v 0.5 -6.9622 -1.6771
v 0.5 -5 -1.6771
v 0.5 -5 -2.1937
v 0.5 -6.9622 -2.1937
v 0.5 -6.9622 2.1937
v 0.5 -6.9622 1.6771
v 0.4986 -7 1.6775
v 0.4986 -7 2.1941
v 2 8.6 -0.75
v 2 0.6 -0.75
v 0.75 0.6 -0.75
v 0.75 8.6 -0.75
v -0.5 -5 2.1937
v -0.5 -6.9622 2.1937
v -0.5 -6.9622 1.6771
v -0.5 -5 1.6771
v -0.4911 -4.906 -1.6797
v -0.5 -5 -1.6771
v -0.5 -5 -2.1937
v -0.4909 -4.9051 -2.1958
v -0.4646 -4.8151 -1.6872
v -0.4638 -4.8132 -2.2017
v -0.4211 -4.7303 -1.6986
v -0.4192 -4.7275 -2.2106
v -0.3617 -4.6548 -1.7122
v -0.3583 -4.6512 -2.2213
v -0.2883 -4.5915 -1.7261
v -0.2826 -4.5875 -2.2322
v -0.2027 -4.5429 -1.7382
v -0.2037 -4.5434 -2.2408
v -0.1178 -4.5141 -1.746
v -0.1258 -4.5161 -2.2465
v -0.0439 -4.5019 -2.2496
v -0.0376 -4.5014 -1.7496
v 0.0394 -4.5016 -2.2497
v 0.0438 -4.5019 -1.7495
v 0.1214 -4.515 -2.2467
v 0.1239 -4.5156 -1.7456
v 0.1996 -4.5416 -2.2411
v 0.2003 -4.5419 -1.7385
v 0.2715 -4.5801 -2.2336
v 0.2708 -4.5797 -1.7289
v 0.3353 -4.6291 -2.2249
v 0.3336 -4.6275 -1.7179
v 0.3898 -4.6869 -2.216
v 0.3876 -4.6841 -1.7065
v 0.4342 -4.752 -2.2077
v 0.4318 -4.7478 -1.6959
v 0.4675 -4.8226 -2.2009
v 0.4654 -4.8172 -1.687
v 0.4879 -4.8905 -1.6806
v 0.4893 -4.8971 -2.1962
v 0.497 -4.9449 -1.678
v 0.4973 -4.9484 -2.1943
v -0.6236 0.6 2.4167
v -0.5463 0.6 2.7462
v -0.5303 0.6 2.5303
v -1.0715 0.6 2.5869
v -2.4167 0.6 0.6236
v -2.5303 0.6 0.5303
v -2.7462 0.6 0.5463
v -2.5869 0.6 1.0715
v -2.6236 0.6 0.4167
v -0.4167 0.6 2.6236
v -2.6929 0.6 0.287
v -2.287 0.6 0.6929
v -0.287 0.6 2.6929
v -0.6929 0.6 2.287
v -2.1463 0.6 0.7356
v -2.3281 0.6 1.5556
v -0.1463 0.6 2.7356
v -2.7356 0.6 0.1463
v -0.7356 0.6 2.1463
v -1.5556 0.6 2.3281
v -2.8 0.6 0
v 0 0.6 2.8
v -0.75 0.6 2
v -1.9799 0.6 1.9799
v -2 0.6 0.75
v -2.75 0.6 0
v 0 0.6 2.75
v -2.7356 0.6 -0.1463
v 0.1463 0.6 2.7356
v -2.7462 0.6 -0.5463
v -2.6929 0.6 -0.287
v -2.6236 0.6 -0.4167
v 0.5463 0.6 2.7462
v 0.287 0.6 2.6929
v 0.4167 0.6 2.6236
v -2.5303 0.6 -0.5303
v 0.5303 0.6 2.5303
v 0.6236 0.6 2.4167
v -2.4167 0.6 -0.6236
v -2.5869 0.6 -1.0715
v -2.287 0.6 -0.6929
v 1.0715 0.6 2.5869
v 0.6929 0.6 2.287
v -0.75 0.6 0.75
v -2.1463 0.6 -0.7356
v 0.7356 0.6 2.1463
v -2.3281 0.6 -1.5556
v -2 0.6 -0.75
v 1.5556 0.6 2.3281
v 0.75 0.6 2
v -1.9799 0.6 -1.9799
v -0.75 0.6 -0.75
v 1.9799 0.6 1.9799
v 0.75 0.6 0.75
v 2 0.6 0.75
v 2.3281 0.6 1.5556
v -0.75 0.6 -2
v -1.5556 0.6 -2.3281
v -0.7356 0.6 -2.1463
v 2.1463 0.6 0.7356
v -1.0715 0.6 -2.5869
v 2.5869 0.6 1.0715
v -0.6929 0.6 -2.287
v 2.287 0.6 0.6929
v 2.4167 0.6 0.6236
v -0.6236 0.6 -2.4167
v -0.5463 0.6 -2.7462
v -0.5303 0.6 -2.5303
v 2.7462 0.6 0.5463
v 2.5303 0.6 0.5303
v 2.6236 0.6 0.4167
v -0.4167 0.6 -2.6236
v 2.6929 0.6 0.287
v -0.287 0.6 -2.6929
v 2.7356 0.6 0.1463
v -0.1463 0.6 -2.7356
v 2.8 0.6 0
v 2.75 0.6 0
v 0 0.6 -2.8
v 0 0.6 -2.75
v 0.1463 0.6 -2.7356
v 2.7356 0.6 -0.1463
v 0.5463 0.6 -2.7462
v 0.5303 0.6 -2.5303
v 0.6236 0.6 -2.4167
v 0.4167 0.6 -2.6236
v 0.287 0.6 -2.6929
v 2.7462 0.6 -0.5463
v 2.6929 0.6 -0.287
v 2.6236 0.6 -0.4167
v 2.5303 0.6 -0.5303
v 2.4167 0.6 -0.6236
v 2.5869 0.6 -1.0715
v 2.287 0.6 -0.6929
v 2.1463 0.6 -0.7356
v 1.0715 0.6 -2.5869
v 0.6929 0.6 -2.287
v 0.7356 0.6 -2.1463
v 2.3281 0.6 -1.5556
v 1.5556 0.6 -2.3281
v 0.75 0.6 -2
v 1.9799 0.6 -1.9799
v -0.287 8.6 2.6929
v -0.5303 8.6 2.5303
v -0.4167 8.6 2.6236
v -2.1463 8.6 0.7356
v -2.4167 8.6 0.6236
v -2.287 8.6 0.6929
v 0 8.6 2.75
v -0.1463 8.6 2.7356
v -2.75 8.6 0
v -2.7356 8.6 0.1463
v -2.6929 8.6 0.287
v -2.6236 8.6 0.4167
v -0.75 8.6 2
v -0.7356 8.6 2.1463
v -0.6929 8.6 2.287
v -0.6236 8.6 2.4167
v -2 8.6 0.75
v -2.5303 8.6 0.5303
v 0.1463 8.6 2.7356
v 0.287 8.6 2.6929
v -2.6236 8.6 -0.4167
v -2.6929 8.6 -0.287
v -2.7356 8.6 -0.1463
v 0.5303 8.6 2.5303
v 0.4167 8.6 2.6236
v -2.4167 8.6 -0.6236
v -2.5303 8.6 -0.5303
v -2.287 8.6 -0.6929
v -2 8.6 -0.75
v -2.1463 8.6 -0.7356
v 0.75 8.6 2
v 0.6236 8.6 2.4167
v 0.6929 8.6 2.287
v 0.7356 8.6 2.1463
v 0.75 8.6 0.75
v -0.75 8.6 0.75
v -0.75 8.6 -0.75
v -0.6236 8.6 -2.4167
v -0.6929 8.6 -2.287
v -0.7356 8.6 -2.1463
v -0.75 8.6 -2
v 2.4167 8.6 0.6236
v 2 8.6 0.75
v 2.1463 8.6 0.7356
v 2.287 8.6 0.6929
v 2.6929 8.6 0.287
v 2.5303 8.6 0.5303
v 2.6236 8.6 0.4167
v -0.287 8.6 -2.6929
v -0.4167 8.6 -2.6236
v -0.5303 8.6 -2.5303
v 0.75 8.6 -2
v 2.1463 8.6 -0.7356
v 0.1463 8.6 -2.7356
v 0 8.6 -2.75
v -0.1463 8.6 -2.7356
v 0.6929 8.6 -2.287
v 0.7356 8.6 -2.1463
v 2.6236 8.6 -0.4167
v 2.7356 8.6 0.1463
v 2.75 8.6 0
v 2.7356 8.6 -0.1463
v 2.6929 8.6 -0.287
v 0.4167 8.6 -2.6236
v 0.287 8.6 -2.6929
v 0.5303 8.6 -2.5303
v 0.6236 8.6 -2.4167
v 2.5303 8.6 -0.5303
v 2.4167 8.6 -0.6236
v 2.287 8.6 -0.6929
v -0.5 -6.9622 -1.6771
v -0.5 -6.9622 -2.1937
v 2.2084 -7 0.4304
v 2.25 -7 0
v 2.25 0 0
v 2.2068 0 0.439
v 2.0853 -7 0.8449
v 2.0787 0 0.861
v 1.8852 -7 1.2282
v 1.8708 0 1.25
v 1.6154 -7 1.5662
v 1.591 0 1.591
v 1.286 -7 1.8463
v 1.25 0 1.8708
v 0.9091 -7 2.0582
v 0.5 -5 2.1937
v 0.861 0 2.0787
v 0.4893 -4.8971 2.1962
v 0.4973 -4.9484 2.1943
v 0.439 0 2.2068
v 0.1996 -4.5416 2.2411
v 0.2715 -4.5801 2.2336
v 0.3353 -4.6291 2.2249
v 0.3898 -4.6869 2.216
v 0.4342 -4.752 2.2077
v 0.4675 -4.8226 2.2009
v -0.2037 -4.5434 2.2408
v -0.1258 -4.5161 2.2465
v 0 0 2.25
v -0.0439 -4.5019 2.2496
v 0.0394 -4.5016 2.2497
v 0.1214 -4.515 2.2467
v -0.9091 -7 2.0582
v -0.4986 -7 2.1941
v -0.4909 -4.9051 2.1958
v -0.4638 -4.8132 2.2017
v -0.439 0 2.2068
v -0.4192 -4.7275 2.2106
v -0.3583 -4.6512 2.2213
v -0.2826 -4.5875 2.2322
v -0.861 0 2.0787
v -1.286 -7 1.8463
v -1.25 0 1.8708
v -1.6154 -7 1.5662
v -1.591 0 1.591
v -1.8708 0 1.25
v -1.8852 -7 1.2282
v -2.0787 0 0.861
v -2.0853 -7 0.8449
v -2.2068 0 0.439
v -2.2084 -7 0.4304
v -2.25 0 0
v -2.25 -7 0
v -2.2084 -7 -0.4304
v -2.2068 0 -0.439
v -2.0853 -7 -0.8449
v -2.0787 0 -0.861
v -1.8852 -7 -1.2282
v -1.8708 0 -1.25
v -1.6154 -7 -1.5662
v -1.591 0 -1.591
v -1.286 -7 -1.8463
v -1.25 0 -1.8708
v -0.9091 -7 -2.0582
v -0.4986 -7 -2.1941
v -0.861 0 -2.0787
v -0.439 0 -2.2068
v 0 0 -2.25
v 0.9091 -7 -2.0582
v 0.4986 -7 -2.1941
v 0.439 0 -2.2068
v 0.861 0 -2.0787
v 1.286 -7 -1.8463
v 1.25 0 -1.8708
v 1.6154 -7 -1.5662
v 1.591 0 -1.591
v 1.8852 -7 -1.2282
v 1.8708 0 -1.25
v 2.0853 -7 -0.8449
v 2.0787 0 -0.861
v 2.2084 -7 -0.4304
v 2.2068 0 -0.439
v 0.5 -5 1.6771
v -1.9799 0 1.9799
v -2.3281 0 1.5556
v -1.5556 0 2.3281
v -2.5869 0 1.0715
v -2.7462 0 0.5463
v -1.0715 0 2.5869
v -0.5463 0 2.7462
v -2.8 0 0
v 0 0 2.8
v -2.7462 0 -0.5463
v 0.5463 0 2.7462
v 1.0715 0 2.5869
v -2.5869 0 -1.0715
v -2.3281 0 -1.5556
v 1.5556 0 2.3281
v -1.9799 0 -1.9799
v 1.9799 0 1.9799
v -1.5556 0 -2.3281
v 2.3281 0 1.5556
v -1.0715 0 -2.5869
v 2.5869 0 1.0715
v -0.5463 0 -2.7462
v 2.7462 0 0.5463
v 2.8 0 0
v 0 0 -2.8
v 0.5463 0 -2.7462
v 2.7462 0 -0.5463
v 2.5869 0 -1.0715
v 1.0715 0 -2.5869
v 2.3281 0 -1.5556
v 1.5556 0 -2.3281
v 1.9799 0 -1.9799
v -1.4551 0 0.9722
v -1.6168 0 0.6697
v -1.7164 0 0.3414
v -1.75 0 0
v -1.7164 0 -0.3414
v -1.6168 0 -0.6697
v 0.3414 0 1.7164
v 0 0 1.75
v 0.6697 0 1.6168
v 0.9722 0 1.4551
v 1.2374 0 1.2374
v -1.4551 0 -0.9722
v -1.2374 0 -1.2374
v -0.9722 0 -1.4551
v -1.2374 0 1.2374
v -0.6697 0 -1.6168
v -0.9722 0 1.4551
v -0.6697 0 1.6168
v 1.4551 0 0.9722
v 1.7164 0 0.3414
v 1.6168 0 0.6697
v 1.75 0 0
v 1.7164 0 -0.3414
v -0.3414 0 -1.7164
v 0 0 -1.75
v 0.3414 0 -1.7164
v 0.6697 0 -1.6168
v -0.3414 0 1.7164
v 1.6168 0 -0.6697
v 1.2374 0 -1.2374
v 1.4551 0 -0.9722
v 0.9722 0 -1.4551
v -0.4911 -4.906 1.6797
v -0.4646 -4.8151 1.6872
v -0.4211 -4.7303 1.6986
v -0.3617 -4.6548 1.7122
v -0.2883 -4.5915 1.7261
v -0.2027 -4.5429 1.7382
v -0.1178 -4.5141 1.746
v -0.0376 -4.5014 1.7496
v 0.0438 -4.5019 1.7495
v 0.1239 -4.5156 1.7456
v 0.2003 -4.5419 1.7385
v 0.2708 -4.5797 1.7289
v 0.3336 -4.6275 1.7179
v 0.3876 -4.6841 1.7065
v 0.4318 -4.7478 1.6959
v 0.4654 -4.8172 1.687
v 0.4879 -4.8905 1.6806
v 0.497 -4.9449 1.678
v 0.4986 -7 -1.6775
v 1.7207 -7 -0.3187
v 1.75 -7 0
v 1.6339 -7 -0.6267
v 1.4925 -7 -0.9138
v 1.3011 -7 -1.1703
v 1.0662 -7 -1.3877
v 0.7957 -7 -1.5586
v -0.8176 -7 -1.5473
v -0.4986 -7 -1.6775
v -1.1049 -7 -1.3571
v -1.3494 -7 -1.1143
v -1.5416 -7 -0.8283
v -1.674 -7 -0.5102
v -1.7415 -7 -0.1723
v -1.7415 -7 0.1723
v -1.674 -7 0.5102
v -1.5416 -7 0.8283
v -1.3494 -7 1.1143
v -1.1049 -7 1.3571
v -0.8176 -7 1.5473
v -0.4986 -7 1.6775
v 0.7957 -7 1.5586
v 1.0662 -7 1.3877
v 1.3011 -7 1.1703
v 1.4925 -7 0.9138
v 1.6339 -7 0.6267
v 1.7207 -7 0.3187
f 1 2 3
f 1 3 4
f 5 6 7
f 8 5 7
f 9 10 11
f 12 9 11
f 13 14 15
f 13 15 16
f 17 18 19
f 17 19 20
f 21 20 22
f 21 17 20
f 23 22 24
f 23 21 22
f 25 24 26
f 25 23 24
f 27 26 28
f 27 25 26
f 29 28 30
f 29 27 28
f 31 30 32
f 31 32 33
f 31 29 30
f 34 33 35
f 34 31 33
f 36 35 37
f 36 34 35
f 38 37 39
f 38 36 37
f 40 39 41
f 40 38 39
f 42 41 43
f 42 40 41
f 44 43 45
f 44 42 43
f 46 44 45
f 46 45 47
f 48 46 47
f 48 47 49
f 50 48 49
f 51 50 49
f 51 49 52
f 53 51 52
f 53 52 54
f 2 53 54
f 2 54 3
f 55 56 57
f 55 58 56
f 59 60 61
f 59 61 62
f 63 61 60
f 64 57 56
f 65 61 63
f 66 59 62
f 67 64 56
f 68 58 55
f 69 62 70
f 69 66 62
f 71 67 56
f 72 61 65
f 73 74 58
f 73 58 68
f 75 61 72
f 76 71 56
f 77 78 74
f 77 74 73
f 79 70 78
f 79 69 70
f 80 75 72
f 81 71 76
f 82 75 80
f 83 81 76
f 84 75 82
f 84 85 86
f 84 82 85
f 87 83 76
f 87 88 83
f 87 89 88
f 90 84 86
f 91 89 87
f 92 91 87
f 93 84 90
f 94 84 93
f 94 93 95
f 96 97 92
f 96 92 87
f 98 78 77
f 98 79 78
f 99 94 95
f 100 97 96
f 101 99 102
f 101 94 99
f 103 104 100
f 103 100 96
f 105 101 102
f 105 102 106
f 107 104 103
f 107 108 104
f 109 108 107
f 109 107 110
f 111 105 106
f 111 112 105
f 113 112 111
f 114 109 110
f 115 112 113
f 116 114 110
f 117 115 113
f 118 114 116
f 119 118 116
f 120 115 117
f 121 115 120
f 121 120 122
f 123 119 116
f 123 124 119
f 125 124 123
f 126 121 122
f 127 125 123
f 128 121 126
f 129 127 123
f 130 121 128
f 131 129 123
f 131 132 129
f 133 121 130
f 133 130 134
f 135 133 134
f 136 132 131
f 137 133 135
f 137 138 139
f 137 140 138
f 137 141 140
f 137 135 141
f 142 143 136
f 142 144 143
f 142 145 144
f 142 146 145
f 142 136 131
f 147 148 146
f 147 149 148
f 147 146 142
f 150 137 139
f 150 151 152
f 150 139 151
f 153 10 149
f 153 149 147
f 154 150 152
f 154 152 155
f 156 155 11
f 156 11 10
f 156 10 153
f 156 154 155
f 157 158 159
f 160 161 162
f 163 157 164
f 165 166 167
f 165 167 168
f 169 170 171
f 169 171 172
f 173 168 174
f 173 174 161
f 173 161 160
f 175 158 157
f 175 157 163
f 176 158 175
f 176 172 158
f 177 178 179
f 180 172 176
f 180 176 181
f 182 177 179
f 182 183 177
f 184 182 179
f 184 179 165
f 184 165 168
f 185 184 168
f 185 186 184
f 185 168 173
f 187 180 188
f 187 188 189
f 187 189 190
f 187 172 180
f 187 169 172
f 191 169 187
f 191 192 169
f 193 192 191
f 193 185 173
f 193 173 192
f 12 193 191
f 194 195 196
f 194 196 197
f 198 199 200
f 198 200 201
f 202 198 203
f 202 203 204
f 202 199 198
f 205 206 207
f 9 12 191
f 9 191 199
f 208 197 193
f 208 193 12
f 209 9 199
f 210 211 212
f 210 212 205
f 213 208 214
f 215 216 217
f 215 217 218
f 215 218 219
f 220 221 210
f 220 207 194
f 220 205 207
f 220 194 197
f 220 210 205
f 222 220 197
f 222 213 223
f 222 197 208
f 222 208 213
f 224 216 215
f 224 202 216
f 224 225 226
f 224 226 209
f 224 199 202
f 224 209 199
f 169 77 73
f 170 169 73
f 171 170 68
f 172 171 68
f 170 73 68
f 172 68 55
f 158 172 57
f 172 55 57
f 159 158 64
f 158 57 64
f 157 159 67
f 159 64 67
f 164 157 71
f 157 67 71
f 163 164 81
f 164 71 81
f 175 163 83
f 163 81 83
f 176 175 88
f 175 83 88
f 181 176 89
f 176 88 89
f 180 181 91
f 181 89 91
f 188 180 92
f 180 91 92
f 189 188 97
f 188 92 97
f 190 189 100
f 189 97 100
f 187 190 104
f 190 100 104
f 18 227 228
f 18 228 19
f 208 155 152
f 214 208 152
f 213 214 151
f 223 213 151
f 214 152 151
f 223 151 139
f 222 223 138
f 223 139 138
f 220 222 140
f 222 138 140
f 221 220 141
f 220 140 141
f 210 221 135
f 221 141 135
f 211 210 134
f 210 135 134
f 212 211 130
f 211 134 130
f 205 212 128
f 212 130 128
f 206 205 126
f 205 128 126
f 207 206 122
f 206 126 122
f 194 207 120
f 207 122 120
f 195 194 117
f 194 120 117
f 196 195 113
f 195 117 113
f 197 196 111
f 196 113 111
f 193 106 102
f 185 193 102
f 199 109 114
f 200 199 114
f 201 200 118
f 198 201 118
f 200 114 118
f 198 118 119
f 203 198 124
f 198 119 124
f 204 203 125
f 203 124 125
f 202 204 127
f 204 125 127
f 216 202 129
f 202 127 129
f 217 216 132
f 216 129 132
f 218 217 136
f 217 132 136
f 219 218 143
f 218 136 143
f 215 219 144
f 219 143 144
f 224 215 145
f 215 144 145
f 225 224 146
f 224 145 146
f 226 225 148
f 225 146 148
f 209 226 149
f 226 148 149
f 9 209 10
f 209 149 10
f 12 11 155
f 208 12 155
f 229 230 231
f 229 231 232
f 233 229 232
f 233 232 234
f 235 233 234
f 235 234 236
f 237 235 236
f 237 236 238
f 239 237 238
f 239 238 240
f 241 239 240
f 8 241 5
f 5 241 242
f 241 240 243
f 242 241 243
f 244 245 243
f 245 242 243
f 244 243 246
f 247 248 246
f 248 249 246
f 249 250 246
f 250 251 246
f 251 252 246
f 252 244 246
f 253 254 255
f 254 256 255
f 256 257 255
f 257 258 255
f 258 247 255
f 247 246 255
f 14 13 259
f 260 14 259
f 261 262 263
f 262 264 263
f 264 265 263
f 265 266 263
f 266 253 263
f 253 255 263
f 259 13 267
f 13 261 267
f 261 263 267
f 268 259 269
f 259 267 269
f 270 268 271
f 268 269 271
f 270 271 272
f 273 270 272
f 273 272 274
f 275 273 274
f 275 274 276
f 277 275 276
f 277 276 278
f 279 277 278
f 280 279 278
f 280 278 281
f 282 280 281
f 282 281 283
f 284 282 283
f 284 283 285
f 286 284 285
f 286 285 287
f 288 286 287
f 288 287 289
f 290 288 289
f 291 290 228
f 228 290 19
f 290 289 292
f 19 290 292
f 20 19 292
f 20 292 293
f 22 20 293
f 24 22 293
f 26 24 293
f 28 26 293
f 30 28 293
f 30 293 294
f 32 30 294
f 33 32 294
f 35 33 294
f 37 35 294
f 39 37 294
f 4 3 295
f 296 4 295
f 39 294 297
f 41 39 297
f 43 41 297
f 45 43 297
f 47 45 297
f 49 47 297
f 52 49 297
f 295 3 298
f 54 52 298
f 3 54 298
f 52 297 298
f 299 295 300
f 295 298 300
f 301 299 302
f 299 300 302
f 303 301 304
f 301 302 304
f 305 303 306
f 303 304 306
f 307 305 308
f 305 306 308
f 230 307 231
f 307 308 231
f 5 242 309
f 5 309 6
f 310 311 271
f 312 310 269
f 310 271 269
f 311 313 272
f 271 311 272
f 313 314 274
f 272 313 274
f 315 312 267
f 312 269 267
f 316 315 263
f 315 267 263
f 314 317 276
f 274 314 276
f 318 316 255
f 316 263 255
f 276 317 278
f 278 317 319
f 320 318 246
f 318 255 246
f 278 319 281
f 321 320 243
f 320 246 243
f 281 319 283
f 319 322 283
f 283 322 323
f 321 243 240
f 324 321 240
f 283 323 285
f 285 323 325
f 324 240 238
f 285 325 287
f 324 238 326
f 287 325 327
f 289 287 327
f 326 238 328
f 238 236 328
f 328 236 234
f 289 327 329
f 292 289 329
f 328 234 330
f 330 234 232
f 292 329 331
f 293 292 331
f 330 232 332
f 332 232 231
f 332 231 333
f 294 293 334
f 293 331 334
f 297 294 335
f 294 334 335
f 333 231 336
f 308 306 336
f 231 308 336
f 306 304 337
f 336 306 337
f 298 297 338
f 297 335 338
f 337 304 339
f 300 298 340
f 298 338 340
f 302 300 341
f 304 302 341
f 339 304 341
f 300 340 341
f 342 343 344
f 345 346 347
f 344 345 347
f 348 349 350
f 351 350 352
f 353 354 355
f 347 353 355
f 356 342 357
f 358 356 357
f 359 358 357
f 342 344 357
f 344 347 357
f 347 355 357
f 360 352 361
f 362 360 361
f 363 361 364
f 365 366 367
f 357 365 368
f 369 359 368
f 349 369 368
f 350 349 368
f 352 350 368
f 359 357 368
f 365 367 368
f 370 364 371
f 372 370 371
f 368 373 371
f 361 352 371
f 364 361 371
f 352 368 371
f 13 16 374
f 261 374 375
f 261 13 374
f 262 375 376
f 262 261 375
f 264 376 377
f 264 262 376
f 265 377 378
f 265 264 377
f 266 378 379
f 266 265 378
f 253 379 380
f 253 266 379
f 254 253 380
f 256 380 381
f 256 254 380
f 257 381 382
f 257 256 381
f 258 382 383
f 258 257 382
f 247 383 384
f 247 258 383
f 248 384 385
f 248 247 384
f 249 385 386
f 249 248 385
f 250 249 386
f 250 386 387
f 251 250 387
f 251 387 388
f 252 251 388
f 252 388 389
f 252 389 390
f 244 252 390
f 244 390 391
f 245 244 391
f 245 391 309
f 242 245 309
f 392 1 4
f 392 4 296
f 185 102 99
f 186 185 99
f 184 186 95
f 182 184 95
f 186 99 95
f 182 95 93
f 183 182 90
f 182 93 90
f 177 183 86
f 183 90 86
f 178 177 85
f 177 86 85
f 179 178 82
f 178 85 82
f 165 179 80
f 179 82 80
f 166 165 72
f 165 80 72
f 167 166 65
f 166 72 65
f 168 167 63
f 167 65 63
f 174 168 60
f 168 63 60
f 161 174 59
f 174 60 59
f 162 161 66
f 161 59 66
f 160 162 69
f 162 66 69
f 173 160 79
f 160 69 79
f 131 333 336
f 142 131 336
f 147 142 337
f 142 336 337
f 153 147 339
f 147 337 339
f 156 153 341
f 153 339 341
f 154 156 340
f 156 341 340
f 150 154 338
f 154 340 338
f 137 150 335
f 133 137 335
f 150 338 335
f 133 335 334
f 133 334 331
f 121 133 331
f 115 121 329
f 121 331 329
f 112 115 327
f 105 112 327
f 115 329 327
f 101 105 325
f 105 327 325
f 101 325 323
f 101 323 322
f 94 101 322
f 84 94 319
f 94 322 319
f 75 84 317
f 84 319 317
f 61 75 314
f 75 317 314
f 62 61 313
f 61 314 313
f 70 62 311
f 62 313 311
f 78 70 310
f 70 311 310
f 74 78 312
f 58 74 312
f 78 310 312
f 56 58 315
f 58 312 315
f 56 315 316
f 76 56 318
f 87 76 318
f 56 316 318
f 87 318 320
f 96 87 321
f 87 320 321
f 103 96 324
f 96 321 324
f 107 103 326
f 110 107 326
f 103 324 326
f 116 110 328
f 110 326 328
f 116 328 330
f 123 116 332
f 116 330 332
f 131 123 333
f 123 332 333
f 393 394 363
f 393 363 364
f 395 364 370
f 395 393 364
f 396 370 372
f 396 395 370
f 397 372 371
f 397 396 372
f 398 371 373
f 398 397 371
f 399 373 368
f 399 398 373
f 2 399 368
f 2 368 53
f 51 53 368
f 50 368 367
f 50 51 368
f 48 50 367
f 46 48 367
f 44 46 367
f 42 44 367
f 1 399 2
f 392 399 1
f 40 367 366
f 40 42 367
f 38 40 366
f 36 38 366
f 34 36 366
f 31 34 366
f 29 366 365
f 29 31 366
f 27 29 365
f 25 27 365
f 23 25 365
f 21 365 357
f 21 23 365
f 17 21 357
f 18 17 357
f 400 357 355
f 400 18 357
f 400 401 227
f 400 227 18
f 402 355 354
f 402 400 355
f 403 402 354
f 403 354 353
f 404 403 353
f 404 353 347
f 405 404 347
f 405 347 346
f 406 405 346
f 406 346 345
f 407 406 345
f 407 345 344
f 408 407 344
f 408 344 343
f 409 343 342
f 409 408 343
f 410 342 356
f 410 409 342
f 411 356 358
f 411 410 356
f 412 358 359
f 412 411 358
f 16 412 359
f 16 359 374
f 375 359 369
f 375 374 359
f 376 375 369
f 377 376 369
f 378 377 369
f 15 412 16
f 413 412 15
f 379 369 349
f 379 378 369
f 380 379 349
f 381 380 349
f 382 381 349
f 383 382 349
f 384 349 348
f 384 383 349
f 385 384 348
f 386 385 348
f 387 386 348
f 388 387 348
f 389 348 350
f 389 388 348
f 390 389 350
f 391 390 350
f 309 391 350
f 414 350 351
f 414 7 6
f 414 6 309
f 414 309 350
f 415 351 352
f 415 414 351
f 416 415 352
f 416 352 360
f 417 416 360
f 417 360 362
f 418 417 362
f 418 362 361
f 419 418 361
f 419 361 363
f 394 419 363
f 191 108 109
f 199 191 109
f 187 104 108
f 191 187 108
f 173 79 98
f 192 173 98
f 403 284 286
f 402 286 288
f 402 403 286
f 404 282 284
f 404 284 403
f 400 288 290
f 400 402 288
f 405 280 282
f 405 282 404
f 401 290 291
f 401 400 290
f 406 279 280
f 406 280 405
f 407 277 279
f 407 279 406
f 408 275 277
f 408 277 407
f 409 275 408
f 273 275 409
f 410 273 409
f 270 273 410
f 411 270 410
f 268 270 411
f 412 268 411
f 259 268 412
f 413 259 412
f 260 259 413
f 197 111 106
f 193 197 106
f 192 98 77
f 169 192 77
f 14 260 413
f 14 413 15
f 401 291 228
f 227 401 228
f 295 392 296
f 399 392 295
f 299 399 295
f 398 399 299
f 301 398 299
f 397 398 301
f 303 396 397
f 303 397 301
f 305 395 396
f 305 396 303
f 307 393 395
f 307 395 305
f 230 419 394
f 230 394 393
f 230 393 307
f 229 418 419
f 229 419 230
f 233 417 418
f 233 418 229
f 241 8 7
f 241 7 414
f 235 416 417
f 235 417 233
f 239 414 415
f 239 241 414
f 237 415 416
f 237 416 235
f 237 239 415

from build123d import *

# Parameters (mm, degrees)
SKETCH1_R           = 2.8
BOSS_EXTRUDE1_DEPTH = 0.6
SKETCH2_W           = 1.5
SKETCH2_H           = 1.5
BOSS_EXTRUDE2_DEPTH = 8
SKETCH6_R           = 2.25
BOSS_EXTRUDE3_DEPTH = 7
CUT_EXTRUDE1_DEPTH  = 103.8
SKETCH9_R           = 1.75
CUT_EXTRUDE3_DEPTH  = 10


with BuildPart() as part:
    # Sketch1 → Boss-Extrude1 (new body)
    with BuildSketch(Plane(origin=(0, 0, 0), x_dir=(1, 0, 0), z_dir=(0, 1, 0))):
        Circle(SKETCH1_R)
    extrude(amount=BOSS_EXTRUDE1_DEPTH)

    # Sketch2 → Boss-Extrude2 (add)
    with BuildSketch(Plane(origin=(0, 0.6, 0), x_dir=(1, 0, 0), z_dir=(0, 1, 0))):
        with BuildLine():
            Line((0.75, 0.75), (0.75, -0.75))
            Line((0.75, -0.75), (2, -0.75))
            ThreePointArc((2, -0.75), (2.75, 0), (2, 0.75))
            Line((2, 0.75), (0.75, 0.75))
        make_face()
        with BuildLine():
            Line((-0.75, 2), (-0.75, 0.75))
            Line((-0.75, 0.75), (0.75, 0.75))
            Line((0.75, 0.75), (0.75, 2))
            ThreePointArc((0.75, 2), (0, 2.75), (-0.75, 2))
        make_face()
        Rectangle(SKETCH2_W, SKETCH2_H)
        with BuildLine():
            Line((-2, -0.75), (-0.75, -0.75))
            Line((-0.75, -0.75), (-0.75, 0.75))
            Line((-0.75, 0.75), (-2, 0.75))
            ThreePointArc((-2, 0.75), (-2.75, 0), (-2, -0.75))
        make_face()
        with BuildLine():
            Line((-0.75, -0.75), (-0.75, -2))
            ThreePointArc((-0.75, -2), (0, -2.75), (0.75, -2))
            Line((0.75, -2), (0.75, -0.75))
            Line((0.75, -0.75), (-0.75, -0.75))
        make_face()
    extrude(amount=BOSS_EXTRUDE2_DEPTH)

    # Sketch6 → Boss-Extrude3 (add)
    with BuildSketch(Plane.XZ):
        Circle(SKETCH6_R)
    extrude(amount=BOSS_EXTRUDE3_DEPTH)

    # Sketch7 → Cut-Extrude1 (cut, through all)
    with BuildSketch(Plane.XY.offset(100)):
        with BuildLine():
            Line((0.5, -5), (0.5, -6.962153423))
            ThreePointArc((0.5, -6.962153423), (0, -7.462153423), (-0.5, -6.962153423))
            Line((-0.5, -6.962153423), (-0.5, -5))
            ThreePointArc((-0.5, -5), (0, -4.5), (0.5, -5))
        make_face()
    extrude(amount=-CUT_EXTRUDE1_DEPTH, mode=Mode.SUBTRACT)

    # Sketch9 → Cut-Extrude3 (cut)
    with BuildSketch(Plane(origin=(0, -10, 0), x_dir=(1, 0, 0), z_dir=(0, 1, 0))):
        Circle(SKETCH9_R)
    extrude(amount=CUT_EXTRUDE3_DEPTH, mode=Mode.SUBTRACT)


solid = part.part
